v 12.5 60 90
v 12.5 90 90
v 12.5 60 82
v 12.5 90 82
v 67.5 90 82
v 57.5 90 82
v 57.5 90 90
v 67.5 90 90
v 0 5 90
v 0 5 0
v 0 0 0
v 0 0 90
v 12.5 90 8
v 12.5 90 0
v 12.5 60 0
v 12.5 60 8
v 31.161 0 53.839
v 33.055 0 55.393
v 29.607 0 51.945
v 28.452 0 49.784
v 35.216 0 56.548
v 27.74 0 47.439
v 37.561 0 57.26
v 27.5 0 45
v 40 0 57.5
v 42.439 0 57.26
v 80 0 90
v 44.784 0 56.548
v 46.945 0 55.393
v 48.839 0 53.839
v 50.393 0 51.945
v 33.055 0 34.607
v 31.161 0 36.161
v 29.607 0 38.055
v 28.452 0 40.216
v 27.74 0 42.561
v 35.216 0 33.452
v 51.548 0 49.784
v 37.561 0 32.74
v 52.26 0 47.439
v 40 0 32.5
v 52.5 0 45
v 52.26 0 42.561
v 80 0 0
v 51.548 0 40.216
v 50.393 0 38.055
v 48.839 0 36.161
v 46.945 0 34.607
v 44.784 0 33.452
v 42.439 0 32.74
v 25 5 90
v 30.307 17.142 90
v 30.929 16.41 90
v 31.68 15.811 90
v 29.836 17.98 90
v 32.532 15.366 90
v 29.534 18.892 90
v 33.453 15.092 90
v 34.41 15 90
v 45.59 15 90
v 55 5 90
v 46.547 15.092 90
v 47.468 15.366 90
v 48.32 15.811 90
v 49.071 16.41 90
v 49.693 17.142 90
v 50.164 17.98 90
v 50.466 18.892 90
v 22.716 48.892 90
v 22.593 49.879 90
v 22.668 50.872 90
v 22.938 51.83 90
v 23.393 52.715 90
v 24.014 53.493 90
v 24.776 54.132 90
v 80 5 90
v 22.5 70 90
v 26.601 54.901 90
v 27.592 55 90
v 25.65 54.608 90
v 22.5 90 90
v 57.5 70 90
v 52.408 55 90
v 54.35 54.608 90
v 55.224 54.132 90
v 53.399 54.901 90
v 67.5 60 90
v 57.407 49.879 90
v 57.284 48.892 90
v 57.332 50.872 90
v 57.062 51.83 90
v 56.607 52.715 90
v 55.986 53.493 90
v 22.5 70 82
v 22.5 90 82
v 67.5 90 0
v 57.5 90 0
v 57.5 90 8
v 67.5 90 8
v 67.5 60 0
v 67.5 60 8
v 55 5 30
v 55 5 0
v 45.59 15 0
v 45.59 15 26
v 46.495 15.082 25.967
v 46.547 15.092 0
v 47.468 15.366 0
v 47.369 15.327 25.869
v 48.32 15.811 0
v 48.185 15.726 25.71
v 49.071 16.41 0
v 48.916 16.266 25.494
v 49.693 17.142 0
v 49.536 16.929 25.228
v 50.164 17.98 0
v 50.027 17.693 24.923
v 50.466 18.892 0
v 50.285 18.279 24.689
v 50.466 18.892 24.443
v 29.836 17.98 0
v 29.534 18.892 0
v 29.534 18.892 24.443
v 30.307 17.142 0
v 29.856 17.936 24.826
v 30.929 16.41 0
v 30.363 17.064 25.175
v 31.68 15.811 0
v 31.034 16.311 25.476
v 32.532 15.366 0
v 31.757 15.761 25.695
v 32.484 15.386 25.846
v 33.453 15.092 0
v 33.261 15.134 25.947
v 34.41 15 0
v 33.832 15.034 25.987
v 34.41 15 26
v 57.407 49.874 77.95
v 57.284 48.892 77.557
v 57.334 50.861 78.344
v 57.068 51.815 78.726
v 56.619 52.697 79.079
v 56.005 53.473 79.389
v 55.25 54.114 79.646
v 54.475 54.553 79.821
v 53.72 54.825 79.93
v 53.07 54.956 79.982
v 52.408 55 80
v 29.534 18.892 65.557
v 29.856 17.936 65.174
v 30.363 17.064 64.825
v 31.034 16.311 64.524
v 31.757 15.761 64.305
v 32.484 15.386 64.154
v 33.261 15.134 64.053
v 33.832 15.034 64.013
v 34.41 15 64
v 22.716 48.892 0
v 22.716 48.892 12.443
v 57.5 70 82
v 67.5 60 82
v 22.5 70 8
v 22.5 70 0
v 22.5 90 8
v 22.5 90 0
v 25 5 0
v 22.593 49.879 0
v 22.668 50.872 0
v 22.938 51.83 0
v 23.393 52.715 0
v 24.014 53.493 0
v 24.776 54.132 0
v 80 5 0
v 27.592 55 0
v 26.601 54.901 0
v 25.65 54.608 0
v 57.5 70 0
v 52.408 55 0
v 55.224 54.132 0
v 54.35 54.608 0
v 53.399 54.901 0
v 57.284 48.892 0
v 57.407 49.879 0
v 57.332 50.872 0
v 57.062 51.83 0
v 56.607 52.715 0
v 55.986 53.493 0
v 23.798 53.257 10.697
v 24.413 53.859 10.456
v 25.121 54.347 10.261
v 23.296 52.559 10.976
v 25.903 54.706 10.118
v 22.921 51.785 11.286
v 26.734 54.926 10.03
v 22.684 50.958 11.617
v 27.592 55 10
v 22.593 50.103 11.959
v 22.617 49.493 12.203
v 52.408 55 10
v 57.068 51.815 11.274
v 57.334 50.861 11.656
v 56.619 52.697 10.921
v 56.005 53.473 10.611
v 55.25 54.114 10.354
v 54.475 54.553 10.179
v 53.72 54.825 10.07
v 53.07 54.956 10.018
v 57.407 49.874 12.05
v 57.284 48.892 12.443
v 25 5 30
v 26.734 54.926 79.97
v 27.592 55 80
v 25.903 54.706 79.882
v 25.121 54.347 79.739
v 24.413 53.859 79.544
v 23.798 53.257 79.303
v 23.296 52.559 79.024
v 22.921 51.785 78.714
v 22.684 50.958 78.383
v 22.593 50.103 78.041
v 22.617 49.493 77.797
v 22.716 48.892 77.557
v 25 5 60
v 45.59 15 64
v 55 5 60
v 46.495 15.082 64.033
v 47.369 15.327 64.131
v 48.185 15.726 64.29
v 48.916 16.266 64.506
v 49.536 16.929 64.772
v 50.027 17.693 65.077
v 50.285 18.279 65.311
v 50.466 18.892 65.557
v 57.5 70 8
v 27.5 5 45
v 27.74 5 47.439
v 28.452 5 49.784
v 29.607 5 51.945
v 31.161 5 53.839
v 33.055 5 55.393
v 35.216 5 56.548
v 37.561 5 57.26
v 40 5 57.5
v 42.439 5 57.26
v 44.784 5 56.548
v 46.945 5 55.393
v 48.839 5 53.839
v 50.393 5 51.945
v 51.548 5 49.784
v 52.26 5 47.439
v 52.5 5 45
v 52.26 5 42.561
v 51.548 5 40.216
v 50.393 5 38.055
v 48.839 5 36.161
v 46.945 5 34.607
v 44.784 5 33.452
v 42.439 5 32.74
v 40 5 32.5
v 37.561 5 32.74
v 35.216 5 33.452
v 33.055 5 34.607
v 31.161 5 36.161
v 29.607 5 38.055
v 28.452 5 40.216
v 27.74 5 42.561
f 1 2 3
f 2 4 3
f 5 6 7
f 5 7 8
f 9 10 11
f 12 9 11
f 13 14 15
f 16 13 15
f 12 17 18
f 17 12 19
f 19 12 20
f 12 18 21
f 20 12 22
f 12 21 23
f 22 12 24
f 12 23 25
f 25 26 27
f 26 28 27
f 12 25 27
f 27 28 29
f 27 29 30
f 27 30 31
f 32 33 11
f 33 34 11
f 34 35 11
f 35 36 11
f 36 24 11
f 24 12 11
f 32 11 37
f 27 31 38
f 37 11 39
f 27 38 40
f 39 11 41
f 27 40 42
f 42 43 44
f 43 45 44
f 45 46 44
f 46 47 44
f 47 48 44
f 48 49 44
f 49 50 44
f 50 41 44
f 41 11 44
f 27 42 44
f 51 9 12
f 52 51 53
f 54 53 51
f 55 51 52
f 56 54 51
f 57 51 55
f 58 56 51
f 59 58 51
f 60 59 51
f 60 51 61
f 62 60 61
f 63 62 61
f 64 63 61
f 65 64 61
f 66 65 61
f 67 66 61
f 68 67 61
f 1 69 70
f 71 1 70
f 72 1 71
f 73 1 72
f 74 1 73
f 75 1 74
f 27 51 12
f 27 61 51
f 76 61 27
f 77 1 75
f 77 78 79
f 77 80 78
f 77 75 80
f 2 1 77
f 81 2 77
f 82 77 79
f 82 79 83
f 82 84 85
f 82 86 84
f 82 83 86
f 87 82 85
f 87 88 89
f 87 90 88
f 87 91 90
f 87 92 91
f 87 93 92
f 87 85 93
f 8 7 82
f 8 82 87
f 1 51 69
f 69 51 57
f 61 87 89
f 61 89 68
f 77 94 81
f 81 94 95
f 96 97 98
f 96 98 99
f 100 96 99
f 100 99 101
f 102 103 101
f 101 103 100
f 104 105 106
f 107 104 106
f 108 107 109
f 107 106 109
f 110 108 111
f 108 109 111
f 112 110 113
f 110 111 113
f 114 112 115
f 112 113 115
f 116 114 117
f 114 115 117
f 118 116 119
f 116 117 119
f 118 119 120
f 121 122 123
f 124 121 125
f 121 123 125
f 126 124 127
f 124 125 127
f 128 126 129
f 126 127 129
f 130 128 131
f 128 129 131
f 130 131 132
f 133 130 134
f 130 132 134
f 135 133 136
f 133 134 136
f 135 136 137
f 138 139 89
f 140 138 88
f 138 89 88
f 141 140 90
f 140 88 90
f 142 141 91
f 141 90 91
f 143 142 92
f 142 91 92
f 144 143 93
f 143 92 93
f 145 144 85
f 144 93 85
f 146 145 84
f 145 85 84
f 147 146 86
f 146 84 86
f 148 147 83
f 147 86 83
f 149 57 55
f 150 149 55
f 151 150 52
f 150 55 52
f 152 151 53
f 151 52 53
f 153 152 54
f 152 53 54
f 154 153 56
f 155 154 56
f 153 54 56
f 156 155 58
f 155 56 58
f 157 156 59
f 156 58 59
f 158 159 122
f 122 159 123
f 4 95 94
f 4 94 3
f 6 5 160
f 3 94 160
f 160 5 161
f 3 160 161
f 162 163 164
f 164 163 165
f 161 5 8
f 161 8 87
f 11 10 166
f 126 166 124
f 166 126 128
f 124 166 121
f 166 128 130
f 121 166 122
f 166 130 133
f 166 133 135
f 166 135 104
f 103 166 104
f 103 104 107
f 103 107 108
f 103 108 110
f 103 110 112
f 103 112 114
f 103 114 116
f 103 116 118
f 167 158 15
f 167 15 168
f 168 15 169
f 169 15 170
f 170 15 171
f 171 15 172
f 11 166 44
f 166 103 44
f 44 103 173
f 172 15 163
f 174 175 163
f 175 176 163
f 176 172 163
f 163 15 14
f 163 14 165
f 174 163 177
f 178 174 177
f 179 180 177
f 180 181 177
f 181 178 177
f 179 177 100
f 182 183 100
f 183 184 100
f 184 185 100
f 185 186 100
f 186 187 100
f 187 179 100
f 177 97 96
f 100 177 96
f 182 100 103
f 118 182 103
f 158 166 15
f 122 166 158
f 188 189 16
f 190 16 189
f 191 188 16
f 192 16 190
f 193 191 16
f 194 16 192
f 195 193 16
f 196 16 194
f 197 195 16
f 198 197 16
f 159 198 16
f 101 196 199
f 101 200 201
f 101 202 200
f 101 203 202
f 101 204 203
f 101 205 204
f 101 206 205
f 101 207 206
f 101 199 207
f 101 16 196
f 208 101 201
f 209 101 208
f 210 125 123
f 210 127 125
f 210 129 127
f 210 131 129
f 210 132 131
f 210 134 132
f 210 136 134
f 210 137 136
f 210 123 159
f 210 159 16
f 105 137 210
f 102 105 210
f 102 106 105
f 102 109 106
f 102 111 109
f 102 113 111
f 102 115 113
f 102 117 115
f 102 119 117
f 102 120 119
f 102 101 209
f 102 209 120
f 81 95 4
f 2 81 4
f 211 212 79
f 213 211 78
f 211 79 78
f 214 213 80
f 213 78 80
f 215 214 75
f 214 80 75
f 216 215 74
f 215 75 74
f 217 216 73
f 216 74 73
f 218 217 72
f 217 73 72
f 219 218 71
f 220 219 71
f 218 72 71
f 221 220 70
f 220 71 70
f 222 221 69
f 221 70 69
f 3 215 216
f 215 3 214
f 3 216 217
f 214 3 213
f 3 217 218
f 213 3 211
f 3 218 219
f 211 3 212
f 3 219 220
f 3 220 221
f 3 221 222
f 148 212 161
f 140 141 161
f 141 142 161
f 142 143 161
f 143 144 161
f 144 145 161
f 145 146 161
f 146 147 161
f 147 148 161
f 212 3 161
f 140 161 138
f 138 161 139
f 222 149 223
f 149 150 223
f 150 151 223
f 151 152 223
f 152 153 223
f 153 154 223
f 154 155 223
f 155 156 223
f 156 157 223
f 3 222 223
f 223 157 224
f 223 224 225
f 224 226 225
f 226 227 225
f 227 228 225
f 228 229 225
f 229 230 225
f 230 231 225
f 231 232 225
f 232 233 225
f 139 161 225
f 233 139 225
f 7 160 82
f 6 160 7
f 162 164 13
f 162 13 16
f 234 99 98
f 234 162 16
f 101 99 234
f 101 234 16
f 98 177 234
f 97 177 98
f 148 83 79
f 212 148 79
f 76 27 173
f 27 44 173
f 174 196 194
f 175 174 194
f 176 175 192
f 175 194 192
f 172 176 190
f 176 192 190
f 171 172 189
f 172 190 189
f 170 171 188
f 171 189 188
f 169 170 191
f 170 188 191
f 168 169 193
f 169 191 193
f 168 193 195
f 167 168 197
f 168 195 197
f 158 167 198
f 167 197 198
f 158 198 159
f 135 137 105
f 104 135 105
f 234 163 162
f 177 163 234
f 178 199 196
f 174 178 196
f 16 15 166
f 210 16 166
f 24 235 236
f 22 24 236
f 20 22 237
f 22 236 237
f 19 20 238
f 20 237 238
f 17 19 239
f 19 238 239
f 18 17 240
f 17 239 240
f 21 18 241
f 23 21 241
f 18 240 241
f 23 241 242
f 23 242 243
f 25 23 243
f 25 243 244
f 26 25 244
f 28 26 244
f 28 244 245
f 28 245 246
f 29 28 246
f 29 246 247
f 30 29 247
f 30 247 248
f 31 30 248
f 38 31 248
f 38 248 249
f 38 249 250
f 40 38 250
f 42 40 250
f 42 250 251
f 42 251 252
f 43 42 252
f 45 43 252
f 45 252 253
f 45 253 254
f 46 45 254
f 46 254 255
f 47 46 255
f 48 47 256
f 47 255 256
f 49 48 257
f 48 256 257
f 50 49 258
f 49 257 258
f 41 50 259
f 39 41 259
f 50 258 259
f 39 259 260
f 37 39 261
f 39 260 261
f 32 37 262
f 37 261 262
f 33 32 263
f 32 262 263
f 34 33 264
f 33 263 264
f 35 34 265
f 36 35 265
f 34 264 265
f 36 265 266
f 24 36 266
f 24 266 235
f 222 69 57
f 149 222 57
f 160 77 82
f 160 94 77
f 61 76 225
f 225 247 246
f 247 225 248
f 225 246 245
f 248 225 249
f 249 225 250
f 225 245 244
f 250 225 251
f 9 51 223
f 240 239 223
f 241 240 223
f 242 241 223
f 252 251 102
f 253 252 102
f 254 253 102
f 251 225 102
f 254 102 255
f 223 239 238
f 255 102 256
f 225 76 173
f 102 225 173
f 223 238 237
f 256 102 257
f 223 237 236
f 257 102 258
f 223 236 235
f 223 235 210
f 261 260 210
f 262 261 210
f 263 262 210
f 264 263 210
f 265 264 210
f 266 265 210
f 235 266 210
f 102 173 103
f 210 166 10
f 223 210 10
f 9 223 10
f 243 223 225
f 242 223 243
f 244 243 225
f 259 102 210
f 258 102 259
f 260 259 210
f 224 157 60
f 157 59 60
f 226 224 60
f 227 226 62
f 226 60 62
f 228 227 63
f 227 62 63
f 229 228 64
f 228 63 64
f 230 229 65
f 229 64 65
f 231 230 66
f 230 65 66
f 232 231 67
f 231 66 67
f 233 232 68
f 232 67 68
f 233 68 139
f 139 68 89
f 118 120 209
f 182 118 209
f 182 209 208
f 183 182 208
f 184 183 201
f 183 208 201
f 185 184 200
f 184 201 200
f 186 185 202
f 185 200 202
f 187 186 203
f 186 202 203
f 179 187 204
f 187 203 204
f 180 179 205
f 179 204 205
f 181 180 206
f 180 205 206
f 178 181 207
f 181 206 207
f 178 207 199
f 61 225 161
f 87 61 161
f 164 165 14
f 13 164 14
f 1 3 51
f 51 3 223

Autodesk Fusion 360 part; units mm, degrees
sketch "Esquisse1" plane through (0, 0, 0) normal (0, 0, 1) x (1, 0, 0)
  line L0 (22.5, 70) -> (57.5, 70)
  line L1 (57.5, 70) -> (57.5, 90)
  line L2 (22.5, 70) -> (22.5, 90)
  line L3 (22.5, 90) -> (12.5, 90)
  line L4 (57.5, 90) -> (67.5, 90)
  line L5 (67.5, 90) -> (67.5, 60)
  line L6 (12.5, 90) -> (12.5, 60)
  line L7 (12.5, 60) -> (25, 5)
  line L8 (25, 5) -> (0, 5)
  line L9 (0, 5) -> (0, 0)
  line L10 (0, 0) -> (80, 0)
  line L11 (80, 0) -> (80, 5)
  line L12 (80, 5) -> (55, 5)
  line L13 (55, 5) -> (67.5, 60)
  dimension "d1" = 70
  dimension "d2" = 35
  dimension "d3" = 20
  dimension "d4" = 10
  dimension "d5" = 30
  dimension "d8" = 5
  dimension "d10" = 10
  dimension "d27" = 80
  dimension "d28" = 55
  dimension "d29" = 12.5
  dimension "d30" = 30
extrude "Extrusion1" add sketch "Esquisse1" along normal blind 90
sketch "Esquisse2" plane through (67.5, 0, 0) normal (1, 0, 0) x (0, 0, -1)
  line L0 (0, 60) -> (0, 90)
  line L1 (0, 90) -> (-90, 90)
  line L2 (-90, 90) -> (-90, 60)
  line L3 (-90, 60) -> (0, 60)
  line L4 (-45, 90) -> (-45, -26) construction
  line L5 (-82, 90) -> (-82, 60)
  line L6 (-82, 60) -> (-60, 5)
  line L7 (-8, 90) -> (-8, 60)
  line L8 (-8, 60) -> (-30, 5)
  line L9 (-60, 5) -> (-30, 5)
  point P0 (-90, 5)
  point P1 (0, 5)
  dimension "d13" = 8
  dimension "d15" = 30
  dimension "d16" = 8
  dimension "d33" = 30
extrude "Extrusion2" cut sketch "Esquisse2" against normal blind 60 contours L3 L6 L8 L9 | L1 L3 L5 L7
sketch "Esquisse3" plane through (0, 0, 90) normal (0, 0, 1) x (1, 0, 0)
  line L0 (22.5, 70) -> (22.5, 90)
  line L1 (22.5, 90) -> (12.5, 90)
  line L2 (12.5, 90) -> (12.5, 60)
  line L3 (12.5, 60) -> (25, 5)
  line L4 (55, 5) -> (67.5, 60)
  line L5 (67.5, 60) -> (67.5, 90)
  line L6 (67.5, 90) -> (57.5, 90)
  line L7 (57.5, 90) -> (57.5, 70)
  line L8 (57.5, 70) -> (22.5, 70)
  line L9 (22.7158, 48.8919) -> (29.534, 18.8919)
  line L10 (34.4097, 15) -> (45.5903, 15)
  line L11 (50.466, 18.8919) -> (57.2842, 48.8919)
  line L12 (52.4085, 55) -> (27.5915, 55)
  arc A0 (27.5915, 55) -> (22.7158, 48.8919) centre (27.5915, 50) ccw
  arc A1 (57.2842, 48.8919) -> (52.4085, 55) centre (52.4085, 50) ccw
  arc A2 (29.534, 18.8919) -> (34.4097, 15) centre (34.4097, 20) ccw
  arc A3 (45.5903, 15) -> (50.466, 18.8919) centre (45.5903, 20) ccw
  line L13 (25, 5) -> (0, 5)
  line L14 (0, 5) -> (0, 0)
  line L15 (0, 0) -> (80, 0)
  line L16 (80, 0) -> (80, 5)
  line L17 (80, 5) -> (55, 5)
  dimension "d20" = 15
  dimension "d21" = 7.5
  dimension "d22" = 7.5
  dimension "d25" = 5
extrude "Extrusion3" cut sketch "Esquisse3" against normal blind 150 contours L9 L10 L11 L12 A0 A1 A2 A3
sketch "Esquisse4" plane through (0, 5, 0) normal (0, 1, 0) x (-1, 0, 0)
  line L0 (-55, 90) -> (-80, 90)
  line L1 (-80, 90) -> (-80, 0)
  line L2 (-80, 0) -> (-55, 0)
  line L3 (-55, 30) -> (-25, 30)
  line L4 (-25, 30) -> (-25, 0)
  line L5 (-25, 0) -> (0, 0)
  line L6 (0, 0) -> (0, 90)
  line L7 (-55, 0) -> (-55, 30)
  line L8 (0, 90) -> (-25, 90)
  circle A0 centre (-40, 45) radius 12.5
  dimension "d34" = 25
extrude "Extrusion4" cut sketch "Esquisse4" against normal blind 20
equation "d14 = 30 mm"
equation "d15 = d14"
equation "d16 = d13"
equation "d29 = ( d27 - d28 ) / 2"
equation "d33 = d15"
